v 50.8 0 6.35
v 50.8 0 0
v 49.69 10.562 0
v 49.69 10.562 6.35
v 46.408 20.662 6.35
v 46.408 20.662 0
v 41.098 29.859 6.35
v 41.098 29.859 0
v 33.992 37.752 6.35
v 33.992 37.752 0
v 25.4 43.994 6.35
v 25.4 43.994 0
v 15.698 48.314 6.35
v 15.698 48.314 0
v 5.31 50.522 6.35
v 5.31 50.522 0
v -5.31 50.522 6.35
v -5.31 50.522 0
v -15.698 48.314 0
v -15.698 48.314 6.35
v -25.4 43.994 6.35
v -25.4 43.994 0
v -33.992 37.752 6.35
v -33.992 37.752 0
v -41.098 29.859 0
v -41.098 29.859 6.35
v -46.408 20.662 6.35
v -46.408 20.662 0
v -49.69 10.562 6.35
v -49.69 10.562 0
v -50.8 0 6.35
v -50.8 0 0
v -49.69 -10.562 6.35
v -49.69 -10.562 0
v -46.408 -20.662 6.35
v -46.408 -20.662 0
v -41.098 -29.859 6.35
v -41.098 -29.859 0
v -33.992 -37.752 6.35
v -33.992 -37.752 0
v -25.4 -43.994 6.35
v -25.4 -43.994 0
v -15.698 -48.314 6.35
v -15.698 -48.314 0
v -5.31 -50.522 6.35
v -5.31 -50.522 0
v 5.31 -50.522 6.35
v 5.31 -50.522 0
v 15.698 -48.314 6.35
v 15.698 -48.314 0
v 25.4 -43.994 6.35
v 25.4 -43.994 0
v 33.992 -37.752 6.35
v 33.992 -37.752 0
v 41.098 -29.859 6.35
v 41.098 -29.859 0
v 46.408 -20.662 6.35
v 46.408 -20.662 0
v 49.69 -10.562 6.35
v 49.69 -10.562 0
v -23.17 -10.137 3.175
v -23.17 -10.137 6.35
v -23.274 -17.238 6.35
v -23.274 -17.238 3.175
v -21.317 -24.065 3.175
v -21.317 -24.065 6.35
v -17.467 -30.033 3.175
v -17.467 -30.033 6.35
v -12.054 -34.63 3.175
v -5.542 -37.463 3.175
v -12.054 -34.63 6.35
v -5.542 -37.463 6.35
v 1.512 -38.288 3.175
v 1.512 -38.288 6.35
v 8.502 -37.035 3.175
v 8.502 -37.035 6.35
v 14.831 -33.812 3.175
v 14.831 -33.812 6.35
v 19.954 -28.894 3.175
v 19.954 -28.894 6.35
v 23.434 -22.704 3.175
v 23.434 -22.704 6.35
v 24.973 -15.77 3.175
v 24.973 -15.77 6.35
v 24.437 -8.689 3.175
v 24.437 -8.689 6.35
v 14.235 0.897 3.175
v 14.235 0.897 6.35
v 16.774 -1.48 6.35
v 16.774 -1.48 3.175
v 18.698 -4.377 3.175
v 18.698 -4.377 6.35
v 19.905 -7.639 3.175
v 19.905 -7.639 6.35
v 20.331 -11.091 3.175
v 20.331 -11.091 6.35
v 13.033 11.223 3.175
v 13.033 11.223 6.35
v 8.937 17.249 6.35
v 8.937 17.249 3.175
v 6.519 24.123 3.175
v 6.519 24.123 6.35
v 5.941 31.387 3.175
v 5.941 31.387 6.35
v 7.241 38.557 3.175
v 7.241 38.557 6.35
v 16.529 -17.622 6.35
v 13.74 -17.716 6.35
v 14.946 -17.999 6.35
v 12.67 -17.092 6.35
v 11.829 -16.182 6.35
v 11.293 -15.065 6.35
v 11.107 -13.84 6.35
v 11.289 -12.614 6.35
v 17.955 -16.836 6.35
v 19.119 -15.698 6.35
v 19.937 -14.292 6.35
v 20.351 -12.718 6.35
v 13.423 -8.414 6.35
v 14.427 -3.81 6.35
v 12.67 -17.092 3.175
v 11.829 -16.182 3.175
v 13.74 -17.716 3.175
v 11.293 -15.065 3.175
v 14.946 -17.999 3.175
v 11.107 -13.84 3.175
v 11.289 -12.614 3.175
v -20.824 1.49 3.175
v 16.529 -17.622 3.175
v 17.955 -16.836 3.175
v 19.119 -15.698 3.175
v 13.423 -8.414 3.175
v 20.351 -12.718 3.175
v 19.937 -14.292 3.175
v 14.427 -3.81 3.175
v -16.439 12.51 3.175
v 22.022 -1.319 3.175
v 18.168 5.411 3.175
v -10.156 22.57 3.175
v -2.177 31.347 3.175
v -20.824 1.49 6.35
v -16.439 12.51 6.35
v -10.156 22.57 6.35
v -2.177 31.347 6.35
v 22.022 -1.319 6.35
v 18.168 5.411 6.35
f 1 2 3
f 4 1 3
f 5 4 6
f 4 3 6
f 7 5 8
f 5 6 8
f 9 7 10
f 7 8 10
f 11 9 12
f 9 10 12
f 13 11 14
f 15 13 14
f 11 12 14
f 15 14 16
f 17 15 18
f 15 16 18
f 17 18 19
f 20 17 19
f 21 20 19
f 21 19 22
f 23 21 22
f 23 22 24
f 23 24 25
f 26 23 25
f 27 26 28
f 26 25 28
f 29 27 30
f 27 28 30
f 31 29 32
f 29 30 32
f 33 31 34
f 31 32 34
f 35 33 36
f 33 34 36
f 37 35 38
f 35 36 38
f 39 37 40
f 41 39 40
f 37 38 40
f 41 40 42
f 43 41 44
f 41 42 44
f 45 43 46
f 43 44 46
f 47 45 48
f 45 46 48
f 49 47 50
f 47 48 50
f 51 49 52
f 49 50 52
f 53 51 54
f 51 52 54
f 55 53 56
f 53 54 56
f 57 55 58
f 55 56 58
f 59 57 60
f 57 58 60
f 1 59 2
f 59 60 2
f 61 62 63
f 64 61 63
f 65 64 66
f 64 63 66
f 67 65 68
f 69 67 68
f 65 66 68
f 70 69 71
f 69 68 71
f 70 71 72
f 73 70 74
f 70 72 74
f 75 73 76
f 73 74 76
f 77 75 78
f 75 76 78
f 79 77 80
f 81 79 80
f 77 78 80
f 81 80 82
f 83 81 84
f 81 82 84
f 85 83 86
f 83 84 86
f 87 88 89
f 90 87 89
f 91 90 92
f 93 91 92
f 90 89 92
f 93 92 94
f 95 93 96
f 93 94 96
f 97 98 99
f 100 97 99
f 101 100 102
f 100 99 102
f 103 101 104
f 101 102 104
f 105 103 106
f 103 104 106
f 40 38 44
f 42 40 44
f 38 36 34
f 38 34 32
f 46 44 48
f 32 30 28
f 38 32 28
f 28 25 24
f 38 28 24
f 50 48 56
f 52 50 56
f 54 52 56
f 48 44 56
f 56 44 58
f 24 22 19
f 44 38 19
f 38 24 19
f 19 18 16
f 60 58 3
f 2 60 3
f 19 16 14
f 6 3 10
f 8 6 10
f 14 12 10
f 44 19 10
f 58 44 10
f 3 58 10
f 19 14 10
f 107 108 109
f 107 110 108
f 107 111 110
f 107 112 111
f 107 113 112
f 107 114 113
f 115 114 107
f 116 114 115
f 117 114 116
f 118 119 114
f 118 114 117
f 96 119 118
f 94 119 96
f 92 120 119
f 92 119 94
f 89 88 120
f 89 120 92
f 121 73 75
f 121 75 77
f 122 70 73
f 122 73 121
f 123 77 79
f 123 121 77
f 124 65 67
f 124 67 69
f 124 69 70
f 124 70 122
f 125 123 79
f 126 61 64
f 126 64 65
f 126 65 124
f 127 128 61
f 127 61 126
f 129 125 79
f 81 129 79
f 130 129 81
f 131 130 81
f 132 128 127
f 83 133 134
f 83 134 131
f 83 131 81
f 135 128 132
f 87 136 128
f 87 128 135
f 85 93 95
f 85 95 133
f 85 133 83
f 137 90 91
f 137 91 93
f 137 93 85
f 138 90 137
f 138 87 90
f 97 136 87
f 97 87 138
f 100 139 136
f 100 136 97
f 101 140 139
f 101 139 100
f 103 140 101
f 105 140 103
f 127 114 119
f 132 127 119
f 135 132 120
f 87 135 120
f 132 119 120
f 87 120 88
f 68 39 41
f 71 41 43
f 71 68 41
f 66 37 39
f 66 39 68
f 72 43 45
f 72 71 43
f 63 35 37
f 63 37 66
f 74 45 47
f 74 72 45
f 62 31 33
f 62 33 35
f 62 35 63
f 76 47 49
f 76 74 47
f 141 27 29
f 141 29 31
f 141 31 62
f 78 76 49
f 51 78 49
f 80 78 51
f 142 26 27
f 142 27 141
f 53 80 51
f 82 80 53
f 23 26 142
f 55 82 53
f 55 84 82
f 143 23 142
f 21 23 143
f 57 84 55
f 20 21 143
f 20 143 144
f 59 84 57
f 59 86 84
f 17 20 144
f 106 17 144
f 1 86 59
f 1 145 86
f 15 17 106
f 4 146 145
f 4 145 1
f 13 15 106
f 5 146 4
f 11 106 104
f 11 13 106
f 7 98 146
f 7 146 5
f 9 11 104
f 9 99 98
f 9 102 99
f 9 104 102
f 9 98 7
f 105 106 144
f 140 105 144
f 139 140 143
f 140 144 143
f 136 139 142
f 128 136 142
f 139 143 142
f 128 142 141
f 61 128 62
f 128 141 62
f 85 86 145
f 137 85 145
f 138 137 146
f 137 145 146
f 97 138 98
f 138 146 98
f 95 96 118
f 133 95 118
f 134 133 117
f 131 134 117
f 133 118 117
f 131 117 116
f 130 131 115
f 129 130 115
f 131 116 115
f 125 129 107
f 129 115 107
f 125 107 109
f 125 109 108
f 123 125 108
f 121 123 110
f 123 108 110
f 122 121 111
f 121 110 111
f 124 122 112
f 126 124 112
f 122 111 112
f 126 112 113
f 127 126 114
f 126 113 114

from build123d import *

# Parameters (mm, degrees)
F0_R     = 50.8
F1_DEPTH = 6.35
F3_DEPTH = 3.175


with BuildPart() as f1:
    # F0 (on Top) → F1 (new body)
    with BuildSketch(Plane.XY):
        Circle(F0_R)
    extrude(amount=F1_DEPTH)

    # F2 (on face) → F3 (cut)
    with BuildSketch(Plane.XY.offset(6.35)):
        with BuildLine():
            ThreePointArc((7.240724, 38.556855), (-13.52335, 17.681434), (-23.170317, -10.137014))
            ThreePointArc((-23.170317, -10.137014), (1.51189, -38.287895), (24.437444, -8.688869))
            ThreePointArc((24.437444, -8.688869), (20.26616, 2.14385), (13.033303, 11.223122))
            ThreePointArc((13.033303, 11.223122), (6.51881, 24.123217), (7.240724, 38.556855))
        make_face()
        with BuildLine():
            ThreePointArc((14.23507, 0.897387), (18.697847, -4.377114), (20.330649, -11.090585))
            ThreePointArc((20.330649, -11.090585), (19.118678, -15.698466), (14.94622, -17.998908))
            ThreePointArc((14.94622, -17.998908), (11.829196, -16.1818), (11.288874, -12.614479))
            ThreePointArc((11.288874, -12.614479), (14.072181, -6.144231), (14.23507, 0.897387))
        make_face(mode=Mode.SUBTRACT)
    extrude(amount=-F3_DEPTH, mode=Mode.SUBTRACT)


solid = f1.part
